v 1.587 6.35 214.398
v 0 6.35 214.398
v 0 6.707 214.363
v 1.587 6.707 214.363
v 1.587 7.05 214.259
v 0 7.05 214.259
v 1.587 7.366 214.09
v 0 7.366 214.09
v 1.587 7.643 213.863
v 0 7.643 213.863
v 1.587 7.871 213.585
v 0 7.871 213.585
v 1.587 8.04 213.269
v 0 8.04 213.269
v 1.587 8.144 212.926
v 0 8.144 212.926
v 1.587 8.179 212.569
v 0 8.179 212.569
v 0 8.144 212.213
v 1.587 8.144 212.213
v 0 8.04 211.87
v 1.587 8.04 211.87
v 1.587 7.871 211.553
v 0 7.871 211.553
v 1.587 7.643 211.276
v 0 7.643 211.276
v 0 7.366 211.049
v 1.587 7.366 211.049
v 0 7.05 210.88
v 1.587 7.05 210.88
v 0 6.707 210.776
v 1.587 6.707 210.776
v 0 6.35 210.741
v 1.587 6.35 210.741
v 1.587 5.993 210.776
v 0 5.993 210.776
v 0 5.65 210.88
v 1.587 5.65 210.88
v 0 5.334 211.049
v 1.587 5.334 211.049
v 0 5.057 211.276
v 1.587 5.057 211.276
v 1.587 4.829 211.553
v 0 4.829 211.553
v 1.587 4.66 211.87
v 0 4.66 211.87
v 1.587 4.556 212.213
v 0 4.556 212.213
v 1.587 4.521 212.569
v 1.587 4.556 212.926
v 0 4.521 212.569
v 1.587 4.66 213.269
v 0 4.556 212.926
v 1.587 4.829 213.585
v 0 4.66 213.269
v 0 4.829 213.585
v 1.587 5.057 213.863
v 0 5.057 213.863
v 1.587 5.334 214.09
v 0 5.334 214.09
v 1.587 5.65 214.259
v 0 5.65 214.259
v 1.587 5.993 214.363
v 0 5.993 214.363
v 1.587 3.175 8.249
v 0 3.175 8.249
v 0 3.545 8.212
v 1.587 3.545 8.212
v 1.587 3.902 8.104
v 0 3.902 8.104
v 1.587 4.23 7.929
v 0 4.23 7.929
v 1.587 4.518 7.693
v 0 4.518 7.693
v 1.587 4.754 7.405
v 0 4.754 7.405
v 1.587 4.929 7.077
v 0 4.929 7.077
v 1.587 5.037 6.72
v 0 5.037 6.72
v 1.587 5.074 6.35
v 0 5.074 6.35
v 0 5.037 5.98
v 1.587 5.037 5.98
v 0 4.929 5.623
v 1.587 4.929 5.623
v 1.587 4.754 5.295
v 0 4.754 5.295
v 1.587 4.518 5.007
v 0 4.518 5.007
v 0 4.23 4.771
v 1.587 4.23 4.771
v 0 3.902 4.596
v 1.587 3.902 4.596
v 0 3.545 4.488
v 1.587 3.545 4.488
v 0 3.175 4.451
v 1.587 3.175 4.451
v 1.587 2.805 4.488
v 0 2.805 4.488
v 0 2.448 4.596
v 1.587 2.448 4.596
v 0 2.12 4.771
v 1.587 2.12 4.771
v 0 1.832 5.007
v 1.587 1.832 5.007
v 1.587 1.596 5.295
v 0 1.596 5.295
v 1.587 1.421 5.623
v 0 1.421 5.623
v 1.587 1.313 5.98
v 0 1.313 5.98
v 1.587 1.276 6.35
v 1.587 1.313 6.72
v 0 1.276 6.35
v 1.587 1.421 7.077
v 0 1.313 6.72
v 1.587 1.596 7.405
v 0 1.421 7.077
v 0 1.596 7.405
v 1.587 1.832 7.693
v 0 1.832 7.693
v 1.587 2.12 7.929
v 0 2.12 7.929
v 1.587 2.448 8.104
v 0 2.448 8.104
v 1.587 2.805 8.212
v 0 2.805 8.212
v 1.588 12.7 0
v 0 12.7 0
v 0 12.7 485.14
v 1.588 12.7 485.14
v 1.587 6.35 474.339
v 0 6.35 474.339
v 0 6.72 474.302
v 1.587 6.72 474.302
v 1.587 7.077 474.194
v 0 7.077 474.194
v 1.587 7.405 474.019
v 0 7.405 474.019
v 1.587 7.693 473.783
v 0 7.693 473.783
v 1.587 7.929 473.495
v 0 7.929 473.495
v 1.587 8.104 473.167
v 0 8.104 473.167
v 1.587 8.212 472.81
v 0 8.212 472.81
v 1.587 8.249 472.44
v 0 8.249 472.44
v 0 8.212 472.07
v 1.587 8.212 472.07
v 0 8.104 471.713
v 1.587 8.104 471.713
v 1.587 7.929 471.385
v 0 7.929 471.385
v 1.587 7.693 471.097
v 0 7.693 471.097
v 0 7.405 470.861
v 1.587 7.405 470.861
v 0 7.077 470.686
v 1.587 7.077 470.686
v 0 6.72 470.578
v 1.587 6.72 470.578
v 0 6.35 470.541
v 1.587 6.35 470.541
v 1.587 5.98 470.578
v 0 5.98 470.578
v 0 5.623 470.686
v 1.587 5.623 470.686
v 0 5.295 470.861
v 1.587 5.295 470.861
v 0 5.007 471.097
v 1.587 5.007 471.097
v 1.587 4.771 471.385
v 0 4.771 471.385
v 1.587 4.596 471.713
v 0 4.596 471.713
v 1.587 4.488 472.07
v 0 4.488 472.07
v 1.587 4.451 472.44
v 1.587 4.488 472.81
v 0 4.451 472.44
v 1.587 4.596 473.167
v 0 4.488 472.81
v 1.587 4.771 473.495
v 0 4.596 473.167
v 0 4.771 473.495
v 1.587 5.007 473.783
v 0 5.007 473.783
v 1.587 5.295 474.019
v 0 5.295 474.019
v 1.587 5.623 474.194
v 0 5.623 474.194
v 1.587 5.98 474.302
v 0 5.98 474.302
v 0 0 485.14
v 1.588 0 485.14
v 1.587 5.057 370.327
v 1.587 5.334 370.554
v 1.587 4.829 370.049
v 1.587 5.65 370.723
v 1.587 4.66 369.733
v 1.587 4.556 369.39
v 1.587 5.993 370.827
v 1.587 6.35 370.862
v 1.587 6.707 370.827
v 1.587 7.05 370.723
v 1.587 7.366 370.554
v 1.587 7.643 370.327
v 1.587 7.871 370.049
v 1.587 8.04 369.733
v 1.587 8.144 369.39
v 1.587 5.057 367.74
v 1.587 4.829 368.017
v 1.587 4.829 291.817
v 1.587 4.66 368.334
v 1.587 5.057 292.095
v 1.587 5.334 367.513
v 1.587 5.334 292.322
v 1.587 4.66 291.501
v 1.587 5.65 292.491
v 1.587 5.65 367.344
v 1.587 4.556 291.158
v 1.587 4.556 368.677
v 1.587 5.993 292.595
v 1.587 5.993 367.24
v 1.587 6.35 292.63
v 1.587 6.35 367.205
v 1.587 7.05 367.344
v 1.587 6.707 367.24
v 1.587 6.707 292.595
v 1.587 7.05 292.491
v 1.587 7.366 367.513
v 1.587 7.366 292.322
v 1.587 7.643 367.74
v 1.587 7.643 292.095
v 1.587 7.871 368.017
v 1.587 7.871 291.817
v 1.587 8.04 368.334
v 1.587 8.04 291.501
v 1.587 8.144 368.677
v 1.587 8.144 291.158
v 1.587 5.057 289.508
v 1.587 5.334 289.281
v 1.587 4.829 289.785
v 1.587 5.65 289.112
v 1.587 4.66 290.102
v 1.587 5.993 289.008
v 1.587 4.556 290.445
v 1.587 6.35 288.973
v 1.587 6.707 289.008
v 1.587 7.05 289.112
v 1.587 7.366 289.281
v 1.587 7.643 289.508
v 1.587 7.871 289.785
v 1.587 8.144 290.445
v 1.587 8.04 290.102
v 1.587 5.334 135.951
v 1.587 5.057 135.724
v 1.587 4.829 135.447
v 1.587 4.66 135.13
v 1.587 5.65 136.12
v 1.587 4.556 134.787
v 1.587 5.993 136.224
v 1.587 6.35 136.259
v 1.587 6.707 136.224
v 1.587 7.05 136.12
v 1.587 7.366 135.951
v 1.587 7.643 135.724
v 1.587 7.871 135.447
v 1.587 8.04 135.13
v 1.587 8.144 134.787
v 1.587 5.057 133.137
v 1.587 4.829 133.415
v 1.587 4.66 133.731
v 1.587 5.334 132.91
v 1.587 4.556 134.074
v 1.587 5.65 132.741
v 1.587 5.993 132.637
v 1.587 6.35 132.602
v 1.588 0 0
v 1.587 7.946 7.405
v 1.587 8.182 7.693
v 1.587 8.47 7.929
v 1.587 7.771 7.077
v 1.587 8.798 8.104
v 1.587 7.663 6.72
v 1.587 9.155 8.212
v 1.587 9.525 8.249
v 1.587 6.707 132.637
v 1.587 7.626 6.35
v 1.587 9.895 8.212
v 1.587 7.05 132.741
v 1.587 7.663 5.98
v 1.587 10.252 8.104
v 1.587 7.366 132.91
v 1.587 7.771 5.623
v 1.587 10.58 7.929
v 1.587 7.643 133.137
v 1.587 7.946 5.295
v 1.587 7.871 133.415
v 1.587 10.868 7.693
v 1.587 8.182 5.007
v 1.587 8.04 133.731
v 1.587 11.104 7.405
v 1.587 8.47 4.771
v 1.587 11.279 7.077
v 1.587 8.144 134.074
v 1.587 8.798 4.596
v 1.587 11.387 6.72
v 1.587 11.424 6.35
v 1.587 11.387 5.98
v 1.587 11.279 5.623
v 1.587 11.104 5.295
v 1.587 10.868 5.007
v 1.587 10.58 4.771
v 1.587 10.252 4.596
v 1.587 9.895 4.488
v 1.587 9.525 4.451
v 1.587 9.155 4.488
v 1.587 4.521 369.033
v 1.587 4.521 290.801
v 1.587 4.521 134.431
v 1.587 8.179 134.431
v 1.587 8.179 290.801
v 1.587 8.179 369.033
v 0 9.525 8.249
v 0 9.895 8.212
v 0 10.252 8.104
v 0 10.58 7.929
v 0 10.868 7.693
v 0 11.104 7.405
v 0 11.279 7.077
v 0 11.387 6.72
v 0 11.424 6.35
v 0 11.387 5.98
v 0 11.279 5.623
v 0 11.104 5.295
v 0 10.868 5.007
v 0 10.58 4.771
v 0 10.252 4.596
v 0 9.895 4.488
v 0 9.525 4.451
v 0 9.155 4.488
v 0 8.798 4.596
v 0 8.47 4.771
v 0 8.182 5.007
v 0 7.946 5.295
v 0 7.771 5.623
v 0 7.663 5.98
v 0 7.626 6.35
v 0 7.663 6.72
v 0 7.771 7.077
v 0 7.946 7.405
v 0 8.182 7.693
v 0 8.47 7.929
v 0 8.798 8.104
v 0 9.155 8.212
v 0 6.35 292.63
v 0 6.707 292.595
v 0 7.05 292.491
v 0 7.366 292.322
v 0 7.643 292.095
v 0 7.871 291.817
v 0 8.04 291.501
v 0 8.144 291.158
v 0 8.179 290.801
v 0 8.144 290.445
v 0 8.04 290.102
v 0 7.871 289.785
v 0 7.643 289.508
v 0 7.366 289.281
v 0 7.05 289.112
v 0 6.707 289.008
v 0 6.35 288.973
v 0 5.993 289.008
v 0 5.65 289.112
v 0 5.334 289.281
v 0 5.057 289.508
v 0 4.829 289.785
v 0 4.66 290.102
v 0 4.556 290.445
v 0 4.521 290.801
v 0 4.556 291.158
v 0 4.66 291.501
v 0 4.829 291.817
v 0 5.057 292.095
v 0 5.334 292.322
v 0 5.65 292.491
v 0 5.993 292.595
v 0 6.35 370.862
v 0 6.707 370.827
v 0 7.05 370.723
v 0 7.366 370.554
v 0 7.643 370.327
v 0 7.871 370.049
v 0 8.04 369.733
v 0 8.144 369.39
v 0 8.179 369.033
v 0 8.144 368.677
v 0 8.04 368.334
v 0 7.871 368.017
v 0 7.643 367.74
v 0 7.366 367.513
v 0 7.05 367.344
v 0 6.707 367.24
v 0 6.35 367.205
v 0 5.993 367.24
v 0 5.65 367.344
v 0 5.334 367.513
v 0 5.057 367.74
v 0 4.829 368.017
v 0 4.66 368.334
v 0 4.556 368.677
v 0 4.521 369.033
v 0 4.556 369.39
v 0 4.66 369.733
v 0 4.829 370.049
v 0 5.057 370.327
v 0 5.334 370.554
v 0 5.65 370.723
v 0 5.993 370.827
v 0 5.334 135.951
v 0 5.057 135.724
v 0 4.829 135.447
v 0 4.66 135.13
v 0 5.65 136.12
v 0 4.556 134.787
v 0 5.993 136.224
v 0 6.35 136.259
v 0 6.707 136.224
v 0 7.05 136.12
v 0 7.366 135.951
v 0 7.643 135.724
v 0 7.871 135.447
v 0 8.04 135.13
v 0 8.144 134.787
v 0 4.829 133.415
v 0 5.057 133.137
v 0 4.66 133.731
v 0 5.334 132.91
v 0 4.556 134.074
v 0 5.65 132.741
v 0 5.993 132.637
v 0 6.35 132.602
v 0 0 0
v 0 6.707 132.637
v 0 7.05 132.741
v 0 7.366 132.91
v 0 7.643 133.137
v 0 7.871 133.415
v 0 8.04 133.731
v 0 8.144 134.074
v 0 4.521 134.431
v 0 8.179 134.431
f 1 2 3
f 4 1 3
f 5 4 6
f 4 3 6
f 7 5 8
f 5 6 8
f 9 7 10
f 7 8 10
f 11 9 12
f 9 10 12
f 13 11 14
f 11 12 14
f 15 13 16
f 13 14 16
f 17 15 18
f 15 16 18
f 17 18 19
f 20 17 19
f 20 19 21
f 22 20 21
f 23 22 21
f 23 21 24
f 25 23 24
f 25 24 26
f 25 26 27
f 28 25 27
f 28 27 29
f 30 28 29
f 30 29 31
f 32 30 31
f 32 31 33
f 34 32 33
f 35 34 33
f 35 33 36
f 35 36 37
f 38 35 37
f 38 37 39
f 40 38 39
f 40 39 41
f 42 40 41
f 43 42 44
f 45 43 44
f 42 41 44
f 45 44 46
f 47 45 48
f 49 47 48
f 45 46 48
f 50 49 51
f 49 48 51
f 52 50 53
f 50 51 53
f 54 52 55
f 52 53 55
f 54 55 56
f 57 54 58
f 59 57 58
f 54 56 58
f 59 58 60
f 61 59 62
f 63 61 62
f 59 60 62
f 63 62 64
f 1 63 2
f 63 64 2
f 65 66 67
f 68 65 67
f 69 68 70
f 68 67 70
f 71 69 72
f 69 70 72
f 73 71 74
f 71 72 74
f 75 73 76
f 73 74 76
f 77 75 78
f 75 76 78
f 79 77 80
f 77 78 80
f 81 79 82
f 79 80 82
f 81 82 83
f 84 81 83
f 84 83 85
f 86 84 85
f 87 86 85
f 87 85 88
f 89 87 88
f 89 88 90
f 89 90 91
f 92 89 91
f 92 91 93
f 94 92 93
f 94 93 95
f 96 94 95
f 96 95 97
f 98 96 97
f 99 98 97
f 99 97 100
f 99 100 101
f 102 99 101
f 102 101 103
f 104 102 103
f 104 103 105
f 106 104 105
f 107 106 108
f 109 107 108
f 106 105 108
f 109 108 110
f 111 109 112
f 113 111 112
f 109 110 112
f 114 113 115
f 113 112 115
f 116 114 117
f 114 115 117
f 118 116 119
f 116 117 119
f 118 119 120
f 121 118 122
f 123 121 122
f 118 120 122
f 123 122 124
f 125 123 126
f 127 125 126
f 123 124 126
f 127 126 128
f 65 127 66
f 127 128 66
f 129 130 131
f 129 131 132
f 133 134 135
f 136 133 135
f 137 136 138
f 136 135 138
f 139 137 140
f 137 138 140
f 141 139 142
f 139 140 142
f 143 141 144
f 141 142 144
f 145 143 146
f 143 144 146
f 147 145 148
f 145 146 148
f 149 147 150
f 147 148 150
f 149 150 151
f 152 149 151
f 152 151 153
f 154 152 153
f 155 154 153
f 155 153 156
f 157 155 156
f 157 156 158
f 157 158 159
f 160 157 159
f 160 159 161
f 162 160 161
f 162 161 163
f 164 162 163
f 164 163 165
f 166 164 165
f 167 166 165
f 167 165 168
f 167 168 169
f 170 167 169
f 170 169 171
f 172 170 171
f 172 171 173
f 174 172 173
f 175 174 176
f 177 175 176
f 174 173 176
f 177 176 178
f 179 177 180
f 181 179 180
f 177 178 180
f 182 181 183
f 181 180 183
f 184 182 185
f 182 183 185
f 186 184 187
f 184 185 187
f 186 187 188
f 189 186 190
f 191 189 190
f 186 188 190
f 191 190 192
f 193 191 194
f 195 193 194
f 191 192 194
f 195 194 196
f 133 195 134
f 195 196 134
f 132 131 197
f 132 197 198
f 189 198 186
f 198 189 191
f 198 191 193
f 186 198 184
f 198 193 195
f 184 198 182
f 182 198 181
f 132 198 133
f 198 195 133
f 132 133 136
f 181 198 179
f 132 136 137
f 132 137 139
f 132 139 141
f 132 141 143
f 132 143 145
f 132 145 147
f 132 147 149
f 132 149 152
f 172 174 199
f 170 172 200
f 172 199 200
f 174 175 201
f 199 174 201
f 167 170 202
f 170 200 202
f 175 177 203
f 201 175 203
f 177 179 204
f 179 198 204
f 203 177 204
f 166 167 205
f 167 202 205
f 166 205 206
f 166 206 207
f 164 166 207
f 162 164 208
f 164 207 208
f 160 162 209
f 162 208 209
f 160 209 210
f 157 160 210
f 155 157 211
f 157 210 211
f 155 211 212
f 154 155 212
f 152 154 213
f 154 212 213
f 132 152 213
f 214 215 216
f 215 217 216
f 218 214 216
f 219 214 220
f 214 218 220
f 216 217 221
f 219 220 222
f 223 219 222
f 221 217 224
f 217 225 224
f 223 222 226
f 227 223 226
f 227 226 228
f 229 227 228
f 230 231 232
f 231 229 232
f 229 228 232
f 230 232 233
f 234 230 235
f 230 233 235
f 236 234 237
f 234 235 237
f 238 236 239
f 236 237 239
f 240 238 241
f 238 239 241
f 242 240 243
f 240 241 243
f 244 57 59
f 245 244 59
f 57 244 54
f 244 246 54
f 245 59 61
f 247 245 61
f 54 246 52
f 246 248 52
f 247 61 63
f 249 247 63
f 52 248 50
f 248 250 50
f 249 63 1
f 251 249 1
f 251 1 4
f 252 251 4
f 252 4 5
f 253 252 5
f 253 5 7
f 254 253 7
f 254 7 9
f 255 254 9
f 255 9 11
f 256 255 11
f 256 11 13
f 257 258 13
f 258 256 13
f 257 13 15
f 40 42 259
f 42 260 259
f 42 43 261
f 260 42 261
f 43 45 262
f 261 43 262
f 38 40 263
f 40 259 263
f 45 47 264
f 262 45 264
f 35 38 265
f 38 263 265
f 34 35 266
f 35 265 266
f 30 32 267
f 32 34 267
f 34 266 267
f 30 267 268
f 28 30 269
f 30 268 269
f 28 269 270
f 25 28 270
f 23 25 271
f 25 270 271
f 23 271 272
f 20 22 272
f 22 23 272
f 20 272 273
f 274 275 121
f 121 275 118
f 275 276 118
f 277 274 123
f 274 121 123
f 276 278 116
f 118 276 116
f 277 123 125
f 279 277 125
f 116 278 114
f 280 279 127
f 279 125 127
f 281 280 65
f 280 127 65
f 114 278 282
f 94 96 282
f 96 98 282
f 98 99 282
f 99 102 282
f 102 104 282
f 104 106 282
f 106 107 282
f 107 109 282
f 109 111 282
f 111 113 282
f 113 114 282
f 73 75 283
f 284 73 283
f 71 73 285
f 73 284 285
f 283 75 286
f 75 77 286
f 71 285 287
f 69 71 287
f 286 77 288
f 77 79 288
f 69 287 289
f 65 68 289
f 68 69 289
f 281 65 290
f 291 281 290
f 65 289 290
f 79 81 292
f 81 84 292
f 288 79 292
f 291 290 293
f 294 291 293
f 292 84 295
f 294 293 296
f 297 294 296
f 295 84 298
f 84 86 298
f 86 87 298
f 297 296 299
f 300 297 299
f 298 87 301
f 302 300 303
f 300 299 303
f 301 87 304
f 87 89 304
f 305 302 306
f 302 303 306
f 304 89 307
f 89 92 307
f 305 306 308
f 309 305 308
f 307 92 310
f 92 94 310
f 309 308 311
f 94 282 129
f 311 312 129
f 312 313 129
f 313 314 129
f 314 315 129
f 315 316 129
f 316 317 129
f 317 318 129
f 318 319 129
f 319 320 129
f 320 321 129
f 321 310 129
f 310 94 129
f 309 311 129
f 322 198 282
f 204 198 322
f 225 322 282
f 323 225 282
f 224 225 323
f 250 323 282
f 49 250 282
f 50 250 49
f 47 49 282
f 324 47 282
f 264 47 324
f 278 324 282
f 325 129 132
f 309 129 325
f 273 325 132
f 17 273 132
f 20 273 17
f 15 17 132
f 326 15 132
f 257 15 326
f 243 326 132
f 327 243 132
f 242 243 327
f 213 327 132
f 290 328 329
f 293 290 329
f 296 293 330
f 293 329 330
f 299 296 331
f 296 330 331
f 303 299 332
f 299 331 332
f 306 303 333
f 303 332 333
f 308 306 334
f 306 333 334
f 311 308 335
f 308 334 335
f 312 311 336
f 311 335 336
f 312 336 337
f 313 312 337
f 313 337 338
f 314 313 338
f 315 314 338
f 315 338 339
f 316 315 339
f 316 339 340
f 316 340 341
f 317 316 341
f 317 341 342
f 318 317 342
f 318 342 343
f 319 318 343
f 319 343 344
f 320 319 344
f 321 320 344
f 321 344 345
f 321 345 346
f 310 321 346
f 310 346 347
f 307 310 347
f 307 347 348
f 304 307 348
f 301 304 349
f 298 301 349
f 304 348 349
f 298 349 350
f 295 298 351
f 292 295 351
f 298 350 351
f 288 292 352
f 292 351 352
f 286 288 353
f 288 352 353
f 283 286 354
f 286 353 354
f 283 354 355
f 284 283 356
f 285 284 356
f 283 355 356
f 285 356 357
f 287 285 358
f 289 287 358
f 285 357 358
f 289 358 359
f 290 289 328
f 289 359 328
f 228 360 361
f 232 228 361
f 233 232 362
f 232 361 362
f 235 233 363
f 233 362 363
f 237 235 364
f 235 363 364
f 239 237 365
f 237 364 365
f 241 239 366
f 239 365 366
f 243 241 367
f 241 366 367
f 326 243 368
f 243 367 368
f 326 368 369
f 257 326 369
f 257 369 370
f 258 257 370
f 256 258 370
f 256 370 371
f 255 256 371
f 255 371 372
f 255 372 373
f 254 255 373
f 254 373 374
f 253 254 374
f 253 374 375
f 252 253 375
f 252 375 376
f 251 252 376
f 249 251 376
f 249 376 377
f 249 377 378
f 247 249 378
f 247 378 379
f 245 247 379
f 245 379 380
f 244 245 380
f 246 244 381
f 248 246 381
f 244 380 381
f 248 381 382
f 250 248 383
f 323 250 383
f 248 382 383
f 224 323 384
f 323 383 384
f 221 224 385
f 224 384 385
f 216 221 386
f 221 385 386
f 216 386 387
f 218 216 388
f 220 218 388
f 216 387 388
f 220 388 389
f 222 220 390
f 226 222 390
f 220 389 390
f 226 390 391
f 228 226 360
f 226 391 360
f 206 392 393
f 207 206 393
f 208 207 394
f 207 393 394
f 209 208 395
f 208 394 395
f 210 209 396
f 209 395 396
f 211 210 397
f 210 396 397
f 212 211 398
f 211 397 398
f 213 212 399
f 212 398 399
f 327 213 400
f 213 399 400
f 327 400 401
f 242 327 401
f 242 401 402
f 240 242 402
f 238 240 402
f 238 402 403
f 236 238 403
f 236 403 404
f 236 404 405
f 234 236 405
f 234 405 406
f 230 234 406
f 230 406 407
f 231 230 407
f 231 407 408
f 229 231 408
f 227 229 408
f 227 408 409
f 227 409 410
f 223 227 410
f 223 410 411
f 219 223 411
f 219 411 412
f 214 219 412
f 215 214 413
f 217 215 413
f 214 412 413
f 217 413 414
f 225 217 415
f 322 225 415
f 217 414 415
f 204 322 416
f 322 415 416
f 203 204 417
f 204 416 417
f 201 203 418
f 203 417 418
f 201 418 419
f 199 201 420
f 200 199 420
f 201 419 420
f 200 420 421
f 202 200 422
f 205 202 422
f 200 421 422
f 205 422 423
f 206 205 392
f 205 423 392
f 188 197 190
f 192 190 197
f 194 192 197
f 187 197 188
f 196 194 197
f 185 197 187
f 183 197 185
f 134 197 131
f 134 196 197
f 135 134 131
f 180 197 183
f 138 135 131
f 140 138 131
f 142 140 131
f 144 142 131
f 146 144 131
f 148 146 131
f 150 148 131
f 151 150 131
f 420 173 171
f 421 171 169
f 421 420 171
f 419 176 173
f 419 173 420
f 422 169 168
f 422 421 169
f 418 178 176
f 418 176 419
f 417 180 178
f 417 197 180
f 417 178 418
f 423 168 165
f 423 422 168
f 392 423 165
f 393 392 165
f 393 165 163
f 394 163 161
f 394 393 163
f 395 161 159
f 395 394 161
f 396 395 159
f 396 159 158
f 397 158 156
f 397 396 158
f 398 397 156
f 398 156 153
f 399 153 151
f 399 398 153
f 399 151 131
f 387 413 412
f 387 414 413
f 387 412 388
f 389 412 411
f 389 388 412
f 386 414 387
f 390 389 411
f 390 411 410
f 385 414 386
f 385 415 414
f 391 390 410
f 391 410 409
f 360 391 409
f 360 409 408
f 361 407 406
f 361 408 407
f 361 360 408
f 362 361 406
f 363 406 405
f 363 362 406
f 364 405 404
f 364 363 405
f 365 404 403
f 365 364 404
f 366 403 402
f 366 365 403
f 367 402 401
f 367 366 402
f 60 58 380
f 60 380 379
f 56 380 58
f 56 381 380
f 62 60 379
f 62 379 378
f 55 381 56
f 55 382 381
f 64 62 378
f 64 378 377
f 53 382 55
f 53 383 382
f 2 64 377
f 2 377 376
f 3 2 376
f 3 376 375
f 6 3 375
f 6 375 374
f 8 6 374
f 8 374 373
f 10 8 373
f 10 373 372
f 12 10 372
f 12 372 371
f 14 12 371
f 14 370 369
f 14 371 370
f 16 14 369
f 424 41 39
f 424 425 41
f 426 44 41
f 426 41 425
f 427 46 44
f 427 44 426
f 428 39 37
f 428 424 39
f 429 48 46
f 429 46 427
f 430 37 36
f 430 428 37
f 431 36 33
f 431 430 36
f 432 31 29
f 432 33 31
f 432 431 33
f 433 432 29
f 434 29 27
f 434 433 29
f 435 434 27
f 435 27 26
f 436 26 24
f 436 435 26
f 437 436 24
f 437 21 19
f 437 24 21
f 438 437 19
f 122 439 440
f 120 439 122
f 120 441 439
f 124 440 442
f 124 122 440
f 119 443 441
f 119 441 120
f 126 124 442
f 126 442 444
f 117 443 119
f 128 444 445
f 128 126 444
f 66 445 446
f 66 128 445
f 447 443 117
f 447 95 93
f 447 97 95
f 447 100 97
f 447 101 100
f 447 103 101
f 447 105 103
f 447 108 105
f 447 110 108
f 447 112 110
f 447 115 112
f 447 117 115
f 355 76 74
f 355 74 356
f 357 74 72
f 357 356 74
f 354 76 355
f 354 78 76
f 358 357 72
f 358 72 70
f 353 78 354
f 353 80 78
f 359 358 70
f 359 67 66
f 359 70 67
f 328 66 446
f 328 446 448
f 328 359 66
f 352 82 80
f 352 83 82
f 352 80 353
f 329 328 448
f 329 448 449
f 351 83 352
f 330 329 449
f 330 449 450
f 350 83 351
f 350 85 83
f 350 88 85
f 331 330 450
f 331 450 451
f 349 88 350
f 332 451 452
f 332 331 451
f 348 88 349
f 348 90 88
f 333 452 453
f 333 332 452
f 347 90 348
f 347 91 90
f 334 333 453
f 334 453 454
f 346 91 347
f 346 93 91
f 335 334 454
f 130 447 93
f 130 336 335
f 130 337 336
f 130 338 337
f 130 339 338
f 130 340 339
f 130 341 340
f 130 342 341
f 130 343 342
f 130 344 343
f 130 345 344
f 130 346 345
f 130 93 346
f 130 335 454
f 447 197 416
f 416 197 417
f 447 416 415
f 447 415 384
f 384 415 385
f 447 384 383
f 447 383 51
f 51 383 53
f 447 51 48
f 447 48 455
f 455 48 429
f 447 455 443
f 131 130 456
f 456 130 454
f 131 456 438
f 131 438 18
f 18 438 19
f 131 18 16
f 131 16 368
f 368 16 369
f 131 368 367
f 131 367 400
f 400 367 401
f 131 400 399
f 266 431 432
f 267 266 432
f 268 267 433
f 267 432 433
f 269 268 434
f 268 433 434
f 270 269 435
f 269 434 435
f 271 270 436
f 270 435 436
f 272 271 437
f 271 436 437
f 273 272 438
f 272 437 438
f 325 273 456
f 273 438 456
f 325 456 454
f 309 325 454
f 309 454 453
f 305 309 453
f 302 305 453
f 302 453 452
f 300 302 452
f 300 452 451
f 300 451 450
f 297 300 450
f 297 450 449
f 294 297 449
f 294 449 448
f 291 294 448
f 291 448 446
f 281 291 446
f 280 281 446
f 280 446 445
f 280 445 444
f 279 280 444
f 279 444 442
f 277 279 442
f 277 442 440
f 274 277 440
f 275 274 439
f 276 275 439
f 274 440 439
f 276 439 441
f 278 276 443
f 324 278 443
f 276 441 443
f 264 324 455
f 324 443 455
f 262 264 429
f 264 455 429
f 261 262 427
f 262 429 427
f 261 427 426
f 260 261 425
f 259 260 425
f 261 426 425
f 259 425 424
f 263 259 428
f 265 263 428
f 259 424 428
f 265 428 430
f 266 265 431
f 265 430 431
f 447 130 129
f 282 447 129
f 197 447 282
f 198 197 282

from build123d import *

# Parameters (mm, degrees)
SKETCH1_W             = 1.5875
SKETCH1_H             = 12.7
BOSS_EXTRUDE1_DEPTH   = 485.14
F_6_CLEARANCE_HOLE2_D = 3.7973
F_6_CLEARANCE_HOLE1_D = 3.7973
F_6_CLEARANCE_HOLE3_D = 3.6576


with BuildPart() as part:
    # Sketch1 → Boss-Extrude1 (new body)
    with BuildSketch(Plane.XY):
        with Locations((0.79375, 6.35)):
            Rectangle(SKETCH1_W, SKETCH1_H)
    extrude(amount=BOSS_EXTRUDE1_DEPTH)

    # #6 Clearance Hole2 (through all)
    with Locations(Plane(origin=(1.5875, 0, 0), x_dir=(0, 0, -1), z_dir=(1, 0, 0))):
        with Locations((-6.35, 9.525), (-6.35, 3.175)):
            Hole(F_6_CLEARANCE_HOLE2_D / 2)

    # #6 Clearance Hole1 (through all)
    with Locations(Plane(origin=(1.5875, 0, 0), x_dir=(0, 0, -1), z_dir=(1, 0, 0))):
        with Locations((-472.44, 6.35)):
            Hole(F_6_CLEARANCE_HOLE1_D / 2)

    # #6 Clearance Hole3 (through all)
    with Locations(Plane(origin=(1.5875, -24.631267391, -47.650434272), x_dir=(0, 0, -1), z_dir=(1, 0, 0))):
        with Locations((-416.683873726, 30.981267391), (-338.451873726, 30.981267391), (-260.219873726, 30.981267391), (-182.081072585, 30.981267391)):
            Hole(F_6_CLEARANCE_HOLE3_D / 2)


solid = part.part
